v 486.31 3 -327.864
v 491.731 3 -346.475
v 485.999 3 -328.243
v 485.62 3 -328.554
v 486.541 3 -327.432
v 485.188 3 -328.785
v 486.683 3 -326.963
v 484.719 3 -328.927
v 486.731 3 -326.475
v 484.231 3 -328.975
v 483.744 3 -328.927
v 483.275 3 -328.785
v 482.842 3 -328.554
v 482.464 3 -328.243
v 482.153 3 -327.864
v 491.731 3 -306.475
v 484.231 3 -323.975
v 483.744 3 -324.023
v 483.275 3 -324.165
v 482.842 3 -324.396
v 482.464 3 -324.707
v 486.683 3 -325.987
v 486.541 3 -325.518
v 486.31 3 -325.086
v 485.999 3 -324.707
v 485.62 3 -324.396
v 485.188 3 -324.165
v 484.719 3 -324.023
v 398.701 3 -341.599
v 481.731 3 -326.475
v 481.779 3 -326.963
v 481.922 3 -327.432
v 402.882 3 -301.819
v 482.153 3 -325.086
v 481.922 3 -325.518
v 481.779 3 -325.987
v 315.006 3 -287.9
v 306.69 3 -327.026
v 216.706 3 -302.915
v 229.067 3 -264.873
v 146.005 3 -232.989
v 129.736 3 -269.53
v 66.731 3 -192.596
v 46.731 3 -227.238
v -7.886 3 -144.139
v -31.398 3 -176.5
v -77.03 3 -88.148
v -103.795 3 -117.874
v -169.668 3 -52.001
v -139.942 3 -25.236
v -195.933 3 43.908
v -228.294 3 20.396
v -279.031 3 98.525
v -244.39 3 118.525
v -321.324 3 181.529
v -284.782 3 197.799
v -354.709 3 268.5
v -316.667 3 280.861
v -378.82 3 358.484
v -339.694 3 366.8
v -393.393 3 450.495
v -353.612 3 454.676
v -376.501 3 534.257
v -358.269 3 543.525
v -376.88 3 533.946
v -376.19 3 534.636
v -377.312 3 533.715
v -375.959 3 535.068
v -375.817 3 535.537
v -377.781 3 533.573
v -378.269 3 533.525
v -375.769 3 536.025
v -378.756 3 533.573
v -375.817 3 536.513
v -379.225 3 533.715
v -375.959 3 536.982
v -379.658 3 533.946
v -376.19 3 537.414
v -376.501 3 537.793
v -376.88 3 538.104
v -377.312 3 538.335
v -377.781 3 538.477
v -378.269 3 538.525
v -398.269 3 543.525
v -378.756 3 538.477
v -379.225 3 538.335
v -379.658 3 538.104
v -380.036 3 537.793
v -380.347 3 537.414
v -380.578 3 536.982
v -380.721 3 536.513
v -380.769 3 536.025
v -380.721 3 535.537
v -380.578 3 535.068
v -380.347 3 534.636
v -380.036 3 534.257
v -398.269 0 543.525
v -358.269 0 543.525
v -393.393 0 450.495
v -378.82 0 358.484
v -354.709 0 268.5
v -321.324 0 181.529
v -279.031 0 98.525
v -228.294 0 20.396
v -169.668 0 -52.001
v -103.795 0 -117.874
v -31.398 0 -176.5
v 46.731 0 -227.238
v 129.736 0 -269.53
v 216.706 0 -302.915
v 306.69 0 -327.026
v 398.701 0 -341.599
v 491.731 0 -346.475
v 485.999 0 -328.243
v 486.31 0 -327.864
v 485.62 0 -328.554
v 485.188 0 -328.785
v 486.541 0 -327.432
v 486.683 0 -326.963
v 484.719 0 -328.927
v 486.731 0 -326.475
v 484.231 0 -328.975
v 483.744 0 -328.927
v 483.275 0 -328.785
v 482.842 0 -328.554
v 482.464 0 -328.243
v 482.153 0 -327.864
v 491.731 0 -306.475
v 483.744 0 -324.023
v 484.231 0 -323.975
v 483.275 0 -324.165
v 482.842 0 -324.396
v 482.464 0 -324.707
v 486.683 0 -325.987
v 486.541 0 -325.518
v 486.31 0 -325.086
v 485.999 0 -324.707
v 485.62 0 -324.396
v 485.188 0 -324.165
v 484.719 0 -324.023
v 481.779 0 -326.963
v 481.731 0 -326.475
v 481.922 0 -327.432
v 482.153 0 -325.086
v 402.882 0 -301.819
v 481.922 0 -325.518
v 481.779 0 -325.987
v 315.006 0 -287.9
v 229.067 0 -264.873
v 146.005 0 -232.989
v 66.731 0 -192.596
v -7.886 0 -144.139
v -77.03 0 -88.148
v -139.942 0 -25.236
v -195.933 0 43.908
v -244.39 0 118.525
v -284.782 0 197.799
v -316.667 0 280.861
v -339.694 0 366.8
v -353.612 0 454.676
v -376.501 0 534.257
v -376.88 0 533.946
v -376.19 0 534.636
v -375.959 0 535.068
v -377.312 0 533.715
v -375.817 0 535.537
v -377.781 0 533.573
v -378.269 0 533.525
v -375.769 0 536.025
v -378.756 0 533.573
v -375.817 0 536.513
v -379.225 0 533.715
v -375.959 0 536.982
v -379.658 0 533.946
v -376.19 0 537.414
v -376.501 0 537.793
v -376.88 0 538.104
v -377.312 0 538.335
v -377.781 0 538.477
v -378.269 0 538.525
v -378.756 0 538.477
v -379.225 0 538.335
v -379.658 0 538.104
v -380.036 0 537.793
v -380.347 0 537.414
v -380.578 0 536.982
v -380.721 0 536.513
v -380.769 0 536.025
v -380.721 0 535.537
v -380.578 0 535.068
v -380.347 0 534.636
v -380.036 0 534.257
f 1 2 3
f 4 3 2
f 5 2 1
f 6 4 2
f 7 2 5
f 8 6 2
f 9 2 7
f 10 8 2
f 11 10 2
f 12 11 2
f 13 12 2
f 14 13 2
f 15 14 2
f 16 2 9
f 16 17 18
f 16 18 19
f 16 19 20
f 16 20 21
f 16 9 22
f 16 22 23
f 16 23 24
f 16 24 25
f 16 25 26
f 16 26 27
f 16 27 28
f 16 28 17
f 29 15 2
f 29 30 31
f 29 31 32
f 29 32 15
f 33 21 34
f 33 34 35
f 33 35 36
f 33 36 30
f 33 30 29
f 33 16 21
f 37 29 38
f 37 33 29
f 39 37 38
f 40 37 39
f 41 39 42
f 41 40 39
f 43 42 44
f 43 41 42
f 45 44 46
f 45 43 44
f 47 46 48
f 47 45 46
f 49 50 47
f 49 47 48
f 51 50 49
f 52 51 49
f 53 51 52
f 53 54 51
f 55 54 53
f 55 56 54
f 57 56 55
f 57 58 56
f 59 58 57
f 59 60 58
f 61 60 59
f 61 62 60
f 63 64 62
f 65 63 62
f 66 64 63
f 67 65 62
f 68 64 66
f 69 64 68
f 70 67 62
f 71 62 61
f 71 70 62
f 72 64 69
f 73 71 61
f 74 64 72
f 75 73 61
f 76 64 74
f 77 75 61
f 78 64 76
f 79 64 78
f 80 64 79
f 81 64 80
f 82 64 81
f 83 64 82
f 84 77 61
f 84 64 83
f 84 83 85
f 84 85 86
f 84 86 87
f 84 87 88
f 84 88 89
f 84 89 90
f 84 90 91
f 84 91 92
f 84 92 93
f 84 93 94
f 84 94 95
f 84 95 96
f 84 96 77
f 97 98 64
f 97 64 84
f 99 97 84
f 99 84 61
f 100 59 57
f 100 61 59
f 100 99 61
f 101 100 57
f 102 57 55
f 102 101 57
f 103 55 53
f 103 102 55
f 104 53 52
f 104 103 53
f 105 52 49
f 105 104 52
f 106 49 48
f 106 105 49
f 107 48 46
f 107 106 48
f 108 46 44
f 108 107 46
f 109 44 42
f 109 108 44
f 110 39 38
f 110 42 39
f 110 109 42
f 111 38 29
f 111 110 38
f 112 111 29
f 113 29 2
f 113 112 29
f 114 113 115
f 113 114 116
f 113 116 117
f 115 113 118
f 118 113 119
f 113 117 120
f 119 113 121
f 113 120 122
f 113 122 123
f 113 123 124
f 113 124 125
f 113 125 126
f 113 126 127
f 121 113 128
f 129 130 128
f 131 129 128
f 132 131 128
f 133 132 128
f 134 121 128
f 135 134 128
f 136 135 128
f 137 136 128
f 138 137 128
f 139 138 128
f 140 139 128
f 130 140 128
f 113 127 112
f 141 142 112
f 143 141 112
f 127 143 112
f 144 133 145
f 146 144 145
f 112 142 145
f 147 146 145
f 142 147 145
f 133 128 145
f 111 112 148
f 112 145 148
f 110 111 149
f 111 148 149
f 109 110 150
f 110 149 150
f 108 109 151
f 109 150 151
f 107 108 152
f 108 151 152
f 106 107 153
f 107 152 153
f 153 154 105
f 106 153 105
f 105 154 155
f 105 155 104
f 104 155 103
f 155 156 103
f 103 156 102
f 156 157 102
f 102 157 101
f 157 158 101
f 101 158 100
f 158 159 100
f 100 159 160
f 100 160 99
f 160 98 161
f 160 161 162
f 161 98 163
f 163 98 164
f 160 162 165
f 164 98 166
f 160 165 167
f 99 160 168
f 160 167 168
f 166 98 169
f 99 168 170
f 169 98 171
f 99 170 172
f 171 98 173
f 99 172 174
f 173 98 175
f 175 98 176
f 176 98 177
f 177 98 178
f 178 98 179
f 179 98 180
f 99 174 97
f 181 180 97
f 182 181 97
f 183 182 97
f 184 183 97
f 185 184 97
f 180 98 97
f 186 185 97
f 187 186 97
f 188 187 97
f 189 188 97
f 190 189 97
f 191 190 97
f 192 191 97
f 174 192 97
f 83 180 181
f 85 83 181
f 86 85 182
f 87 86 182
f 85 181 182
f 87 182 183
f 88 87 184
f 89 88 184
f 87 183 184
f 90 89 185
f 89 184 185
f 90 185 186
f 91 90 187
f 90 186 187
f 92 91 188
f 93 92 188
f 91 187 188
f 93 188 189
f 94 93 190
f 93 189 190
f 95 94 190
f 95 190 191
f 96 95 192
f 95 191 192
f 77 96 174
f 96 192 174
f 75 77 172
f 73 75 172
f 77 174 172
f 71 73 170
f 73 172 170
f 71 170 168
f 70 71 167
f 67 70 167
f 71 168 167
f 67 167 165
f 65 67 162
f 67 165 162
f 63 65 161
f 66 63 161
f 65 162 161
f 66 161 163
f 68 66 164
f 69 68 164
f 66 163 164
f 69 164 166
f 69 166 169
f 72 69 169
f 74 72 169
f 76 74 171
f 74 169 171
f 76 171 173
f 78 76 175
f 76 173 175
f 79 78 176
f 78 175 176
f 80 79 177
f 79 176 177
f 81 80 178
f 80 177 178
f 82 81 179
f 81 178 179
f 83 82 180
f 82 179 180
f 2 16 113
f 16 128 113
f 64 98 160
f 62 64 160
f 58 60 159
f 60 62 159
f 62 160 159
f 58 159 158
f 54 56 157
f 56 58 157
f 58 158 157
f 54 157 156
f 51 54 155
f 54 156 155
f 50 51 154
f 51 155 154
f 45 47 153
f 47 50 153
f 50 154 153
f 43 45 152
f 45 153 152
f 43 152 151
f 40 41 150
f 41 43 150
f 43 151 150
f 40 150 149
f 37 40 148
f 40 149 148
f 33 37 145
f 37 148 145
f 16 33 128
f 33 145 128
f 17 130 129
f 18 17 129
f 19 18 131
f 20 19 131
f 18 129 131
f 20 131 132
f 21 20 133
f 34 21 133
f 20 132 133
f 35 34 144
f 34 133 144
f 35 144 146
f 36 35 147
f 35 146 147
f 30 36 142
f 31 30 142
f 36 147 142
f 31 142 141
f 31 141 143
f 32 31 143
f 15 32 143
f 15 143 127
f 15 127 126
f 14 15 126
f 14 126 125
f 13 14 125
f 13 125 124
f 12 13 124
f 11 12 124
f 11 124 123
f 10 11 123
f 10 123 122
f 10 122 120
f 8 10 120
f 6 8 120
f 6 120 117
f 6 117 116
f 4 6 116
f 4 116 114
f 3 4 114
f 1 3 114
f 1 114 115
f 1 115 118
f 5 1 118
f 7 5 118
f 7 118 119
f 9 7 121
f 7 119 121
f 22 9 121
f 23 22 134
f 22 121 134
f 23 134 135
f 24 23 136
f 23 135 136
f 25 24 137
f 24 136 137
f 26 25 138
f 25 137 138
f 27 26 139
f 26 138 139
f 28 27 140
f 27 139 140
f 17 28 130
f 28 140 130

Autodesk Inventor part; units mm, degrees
ref_plane "YZ Plane" through (0, 0, 0) normal (1, 0, 0) x (0, 1, 0)
ref_plane "XZ Plane" through (0, 0, 0) normal (0, 1, 0) x (-1, 0, 0)
ref_plane "XY Plane" through (0, 0, 0) normal (0, 0, 1) x (1, 0, 0)
sketch "Esboço1" plane through (0, 0, 0) normal (0, 1, 0) x (-1, 0, 0)
  arc A0 (-491.7313, -306.4749) -> (358.2687, 543.5251) centre (-491.7313, 543.5251) ccw
  arc A1 (-491.7313, -346.4749) -> (398.2687, 543.5251) centre (-491.7313, 543.5251) ccw
  line L0 (358.2687, 543.5251) -> (398.2687, 543.5251)
  line L1 (-491.7313, -306.4749) -> (-491.7313, -346.4749)
  point P0 (0, 0)
  dimension "d0" = 850
  dimension "d1" = 890
extrude "Extrusão1" add sketch "Esboço1" along normal blind 3
sketch "Esboço2" plane through (0, 3, 0) normal (0, 1, 0) x (1, 0, 0)
  circle A0 centre (-378.2687, -536.0251) radius 2.5
  circle A1 centre (484.2313, 326.4749) radius 2.5
  line L0 (491.7313, 306.4749) -> (491.7313, 346.4749) projected
  line L1 (-398.2687, -543.5251) -> (-358.2687, -543.5251) projected
  point P0 (0, 0)
  dimension "d16" = 5
  dimension "d17" = 5
  dimension "d18" = 7.5
  dimension "d19" = 20
  dimension "d20" = 7.5
  dimension "d21" = 20
hole "Furo1" at (-378.2687, 3, 536.0251) at (484.2313, 3, -326.4749) direction (0, -1, 0) diameter 5 end through all
properties part number "Arco médio" material "Alumínio 6061"
